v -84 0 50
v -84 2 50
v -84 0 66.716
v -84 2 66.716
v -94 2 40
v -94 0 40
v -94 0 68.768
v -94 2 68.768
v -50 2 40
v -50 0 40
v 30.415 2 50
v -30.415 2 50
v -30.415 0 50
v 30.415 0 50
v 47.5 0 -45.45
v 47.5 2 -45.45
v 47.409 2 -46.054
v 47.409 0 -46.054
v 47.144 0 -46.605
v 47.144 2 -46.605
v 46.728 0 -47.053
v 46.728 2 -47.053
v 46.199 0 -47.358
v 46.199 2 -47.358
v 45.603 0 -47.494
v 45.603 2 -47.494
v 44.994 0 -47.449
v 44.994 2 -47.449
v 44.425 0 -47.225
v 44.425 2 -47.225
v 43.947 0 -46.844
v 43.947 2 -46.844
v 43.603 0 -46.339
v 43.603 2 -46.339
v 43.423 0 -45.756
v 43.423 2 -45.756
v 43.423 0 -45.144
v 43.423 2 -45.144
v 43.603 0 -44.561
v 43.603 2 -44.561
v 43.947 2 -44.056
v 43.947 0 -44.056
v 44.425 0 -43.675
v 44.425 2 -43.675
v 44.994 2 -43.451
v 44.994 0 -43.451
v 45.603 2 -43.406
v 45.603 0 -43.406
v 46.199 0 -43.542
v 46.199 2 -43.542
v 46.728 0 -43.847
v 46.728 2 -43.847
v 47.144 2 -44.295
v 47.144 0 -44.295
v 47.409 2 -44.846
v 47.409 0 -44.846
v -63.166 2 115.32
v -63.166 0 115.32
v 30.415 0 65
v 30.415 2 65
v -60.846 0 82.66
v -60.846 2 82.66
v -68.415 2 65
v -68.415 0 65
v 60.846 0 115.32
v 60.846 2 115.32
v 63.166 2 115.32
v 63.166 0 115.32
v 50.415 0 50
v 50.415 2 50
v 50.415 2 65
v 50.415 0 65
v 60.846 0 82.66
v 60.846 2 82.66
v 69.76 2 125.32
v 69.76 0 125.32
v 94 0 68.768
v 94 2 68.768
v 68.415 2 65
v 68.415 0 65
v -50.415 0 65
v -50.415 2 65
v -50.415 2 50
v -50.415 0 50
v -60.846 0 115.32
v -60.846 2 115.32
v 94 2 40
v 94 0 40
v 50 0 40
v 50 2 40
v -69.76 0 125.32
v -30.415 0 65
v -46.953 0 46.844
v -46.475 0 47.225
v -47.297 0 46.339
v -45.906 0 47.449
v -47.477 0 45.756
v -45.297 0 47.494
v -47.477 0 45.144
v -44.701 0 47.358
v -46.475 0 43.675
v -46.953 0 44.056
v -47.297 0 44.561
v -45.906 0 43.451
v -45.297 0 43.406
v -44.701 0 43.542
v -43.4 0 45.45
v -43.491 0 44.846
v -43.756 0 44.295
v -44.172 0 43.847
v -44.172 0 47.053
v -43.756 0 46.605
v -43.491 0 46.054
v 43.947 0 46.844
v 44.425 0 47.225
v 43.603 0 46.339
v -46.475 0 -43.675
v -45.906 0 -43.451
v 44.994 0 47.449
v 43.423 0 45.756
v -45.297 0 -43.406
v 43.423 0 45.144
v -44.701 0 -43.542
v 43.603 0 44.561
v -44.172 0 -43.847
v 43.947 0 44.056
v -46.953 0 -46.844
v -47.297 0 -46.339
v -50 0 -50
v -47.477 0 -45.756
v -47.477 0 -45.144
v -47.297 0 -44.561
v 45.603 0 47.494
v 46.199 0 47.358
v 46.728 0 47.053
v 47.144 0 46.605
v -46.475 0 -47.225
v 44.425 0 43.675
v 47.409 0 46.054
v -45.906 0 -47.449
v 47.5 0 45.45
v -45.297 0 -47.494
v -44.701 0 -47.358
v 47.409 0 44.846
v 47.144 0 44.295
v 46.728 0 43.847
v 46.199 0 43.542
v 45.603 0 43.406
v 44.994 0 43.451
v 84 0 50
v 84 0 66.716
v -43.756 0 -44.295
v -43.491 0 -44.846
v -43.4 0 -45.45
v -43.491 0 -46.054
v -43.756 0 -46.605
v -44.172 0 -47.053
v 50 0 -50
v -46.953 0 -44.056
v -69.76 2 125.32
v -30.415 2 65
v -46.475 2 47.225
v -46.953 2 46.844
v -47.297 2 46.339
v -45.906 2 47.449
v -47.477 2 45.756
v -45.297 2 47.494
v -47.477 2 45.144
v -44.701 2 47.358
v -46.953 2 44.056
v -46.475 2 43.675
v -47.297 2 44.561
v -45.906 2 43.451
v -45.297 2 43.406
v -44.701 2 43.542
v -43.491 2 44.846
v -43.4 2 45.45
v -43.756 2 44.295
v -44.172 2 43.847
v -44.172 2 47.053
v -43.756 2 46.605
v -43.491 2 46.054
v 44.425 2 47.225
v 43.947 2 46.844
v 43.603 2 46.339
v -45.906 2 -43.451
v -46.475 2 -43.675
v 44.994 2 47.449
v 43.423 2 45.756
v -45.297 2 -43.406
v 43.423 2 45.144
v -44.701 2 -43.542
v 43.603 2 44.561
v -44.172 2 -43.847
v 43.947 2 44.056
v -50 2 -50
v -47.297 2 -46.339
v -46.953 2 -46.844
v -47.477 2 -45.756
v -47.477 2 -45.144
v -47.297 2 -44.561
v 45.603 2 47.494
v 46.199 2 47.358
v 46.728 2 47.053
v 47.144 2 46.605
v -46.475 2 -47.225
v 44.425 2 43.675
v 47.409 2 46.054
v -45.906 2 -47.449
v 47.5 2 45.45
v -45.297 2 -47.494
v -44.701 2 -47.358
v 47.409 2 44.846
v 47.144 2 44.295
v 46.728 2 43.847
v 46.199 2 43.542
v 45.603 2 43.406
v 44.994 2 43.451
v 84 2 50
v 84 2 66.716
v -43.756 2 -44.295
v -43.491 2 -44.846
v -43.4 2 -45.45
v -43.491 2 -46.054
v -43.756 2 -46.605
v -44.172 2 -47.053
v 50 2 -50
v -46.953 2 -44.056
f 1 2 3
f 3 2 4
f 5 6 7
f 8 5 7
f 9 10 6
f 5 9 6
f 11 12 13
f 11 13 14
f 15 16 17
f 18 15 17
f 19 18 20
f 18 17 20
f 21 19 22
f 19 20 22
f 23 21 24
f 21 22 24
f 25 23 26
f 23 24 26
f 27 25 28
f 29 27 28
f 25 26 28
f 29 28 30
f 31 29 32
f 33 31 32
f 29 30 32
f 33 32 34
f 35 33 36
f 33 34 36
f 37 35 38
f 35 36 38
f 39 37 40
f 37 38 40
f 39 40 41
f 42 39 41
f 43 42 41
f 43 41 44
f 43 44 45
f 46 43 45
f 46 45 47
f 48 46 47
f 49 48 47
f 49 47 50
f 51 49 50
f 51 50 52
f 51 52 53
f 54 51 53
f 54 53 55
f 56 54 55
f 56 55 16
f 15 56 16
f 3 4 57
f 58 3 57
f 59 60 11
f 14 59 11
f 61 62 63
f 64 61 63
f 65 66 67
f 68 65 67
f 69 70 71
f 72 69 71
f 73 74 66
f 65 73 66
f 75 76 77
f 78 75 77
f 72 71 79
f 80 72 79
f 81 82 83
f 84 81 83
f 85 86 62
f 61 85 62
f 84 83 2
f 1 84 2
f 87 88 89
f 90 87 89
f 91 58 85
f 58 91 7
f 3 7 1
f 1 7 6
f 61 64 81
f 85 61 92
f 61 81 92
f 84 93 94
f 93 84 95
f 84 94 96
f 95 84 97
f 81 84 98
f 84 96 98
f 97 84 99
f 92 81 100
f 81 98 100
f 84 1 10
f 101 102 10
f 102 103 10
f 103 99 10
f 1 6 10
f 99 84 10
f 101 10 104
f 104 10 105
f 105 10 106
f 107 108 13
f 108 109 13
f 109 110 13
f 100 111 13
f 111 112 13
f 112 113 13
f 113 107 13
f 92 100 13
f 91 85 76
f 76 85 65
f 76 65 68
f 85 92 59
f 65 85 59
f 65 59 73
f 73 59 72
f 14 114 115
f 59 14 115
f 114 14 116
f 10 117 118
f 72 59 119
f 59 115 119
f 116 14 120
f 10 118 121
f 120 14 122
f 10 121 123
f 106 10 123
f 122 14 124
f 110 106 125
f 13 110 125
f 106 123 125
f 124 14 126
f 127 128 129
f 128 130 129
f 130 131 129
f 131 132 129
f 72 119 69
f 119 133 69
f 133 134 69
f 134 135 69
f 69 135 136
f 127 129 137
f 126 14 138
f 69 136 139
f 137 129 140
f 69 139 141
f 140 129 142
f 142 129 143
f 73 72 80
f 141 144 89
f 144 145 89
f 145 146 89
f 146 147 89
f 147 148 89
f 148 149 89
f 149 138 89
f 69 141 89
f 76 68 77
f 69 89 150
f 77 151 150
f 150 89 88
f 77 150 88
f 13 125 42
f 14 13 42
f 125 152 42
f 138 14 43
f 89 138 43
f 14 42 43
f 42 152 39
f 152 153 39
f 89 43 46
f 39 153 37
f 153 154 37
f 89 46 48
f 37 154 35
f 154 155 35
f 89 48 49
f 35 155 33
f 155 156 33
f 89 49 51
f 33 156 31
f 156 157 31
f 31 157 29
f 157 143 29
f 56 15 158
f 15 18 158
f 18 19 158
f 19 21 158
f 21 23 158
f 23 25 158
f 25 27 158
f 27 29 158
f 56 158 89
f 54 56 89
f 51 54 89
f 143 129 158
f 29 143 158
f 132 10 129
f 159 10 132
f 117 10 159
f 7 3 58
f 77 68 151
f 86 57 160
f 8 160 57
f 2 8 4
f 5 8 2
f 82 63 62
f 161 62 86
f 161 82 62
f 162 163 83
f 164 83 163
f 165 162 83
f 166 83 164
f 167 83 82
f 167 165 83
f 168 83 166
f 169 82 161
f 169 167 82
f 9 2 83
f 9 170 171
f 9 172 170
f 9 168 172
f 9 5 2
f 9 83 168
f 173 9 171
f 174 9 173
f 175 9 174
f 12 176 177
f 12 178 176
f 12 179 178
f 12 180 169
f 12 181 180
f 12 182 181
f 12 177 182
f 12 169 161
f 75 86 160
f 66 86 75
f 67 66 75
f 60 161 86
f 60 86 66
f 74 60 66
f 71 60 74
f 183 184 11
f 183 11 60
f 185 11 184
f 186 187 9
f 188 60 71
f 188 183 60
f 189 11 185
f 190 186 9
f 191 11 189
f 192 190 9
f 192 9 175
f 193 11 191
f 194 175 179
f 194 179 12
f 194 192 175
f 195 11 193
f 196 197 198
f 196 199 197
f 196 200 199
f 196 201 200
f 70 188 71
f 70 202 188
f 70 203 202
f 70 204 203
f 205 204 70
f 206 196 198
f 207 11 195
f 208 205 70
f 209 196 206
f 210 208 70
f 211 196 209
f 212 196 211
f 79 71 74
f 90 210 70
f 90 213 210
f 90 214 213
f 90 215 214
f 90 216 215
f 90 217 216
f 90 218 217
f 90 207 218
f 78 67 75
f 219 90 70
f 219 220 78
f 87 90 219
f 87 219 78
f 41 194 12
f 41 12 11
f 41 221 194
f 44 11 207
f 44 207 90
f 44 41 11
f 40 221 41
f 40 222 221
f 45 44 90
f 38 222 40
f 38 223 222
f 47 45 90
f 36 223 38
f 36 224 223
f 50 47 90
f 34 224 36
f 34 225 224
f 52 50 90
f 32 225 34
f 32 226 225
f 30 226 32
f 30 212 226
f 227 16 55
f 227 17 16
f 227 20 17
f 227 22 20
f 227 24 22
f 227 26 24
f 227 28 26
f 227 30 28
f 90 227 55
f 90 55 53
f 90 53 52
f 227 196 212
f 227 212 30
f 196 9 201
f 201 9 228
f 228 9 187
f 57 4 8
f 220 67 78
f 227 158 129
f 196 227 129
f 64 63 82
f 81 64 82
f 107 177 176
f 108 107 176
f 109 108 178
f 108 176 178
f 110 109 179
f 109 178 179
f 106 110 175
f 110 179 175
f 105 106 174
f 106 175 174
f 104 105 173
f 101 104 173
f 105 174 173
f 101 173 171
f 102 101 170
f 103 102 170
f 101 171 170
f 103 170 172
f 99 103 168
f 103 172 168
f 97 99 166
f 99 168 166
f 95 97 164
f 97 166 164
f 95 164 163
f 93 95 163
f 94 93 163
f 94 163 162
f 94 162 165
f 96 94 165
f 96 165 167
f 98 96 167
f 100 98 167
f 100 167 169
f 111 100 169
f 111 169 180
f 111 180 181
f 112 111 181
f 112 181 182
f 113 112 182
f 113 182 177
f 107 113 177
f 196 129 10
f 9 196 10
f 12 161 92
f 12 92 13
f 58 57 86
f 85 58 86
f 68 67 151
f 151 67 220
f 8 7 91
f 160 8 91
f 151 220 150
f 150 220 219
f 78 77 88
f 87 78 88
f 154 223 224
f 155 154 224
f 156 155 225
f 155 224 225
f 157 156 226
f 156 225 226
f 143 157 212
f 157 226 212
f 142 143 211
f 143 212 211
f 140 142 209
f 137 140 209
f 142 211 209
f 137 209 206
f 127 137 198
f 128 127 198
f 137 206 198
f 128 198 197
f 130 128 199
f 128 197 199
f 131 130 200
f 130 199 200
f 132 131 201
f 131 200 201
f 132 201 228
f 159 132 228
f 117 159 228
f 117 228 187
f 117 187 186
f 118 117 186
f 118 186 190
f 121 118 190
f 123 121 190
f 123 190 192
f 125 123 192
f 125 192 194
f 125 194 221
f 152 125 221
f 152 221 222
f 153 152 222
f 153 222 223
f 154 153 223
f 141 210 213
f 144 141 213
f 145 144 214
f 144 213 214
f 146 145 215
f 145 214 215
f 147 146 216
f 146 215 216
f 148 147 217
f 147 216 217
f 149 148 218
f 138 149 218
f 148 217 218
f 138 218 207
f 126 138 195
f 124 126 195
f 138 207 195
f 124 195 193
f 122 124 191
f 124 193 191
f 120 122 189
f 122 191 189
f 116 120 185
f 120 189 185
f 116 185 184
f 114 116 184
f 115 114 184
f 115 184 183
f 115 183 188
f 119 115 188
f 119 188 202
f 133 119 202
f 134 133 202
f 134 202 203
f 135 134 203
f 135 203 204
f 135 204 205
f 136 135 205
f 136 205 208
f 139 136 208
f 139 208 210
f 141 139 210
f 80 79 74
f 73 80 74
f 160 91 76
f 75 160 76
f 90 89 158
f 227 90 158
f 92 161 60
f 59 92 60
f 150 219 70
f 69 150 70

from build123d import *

# Parameters (mm, degrees)
SALIENTE_EXTRUIR1_DEPTH    = 2
CROQUIS2_R                 = 2.05
CORTAR_EXTRUIR1_DEPTH      = 3
CROQUIS7_W                 = 60.830944854
CROQUIS7_H                 = 15
CORTAR_EXTRUIR2_DEPTH      = 1
CORTAR_EXTRUIR2_DEPTH_BACK = 5


with BuildPart() as part:
    # Croquis1 → Saliente-Extruir1 (new body)
    with BuildSketch(Plane(origin=(0, 0, 0), x_dir=(1, 0, 0), z_dir=(0, 1, 0))):
        Polygon((94, -40), (50, -40), (50, 50), (-50, 50), (-50, -40), (-94, -40), (-94, -68.768453788), (-69.76, -125.32), (69.76, -125.32), (94, -68.768453788), align=None)
    extrude(amount=SALIENTE_EXTRUIR1_DEPTH)

    # Croquis2 → Cortar-Extruir1 (cut, through all)
    with BuildSketch(Plane(origin=(0, 2, 0), x_dir=(1, 0, 0), z_dir=(0, 1, 0))):
        with Locations((-45.45, -45.45)):
            Circle(CROQUIS2_R)
        with Locations((45.45, -45.45)):
            Circle(CROQUIS2_R)
        with Locations((-45.45, 45.45)):
            Circle(CROQUIS2_R)
        with Locations((45.45, 45.45)):
            Circle(CROQUIS2_R)
    extrude(amount=-CORTAR_EXTRUIR1_DEPTH, mode=Mode.SUBTRACT)

    # Croquis7 → Cortar-Extruir2 (cut, two sides)
    with BuildSketch(Plane(origin=(0, 2, 0), x_dir=(1, 0, 0), z_dir=(0, 1, 0))) as cortar_extruir2_sk:
        Polygon((-60.845769586, -115.32), (-60.845769586, -82.66), (-68.415472427, -65), (-50.415472427, -65), (-50.415472427, -50), (-84, -50), (-84, -66.715594747), (-63.166426698, -115.32), align=None)
        with Locations((0, -57.5)):
            Rectangle(CROQUIS7_W, CROQUIS7_H)
        Polygon((84, -50), (50.415472427, -50), (50.415472427, -65), (68.415472427, -65), (60.845769586, -82.66), (60.845769586, -115.32), (63.166426698, -115.32), (84, -66.715594747), align=None)
    extrude(amount=CORTAR_EXTRUIR2_DEPTH, mode=Mode.SUBTRACT)
    extrude(cortar_extruir2_sk.sketch, amount=-CORTAR_EXTRUIR2_DEPTH_BACK, mode=Mode.SUBTRACT)


solid = part.part
